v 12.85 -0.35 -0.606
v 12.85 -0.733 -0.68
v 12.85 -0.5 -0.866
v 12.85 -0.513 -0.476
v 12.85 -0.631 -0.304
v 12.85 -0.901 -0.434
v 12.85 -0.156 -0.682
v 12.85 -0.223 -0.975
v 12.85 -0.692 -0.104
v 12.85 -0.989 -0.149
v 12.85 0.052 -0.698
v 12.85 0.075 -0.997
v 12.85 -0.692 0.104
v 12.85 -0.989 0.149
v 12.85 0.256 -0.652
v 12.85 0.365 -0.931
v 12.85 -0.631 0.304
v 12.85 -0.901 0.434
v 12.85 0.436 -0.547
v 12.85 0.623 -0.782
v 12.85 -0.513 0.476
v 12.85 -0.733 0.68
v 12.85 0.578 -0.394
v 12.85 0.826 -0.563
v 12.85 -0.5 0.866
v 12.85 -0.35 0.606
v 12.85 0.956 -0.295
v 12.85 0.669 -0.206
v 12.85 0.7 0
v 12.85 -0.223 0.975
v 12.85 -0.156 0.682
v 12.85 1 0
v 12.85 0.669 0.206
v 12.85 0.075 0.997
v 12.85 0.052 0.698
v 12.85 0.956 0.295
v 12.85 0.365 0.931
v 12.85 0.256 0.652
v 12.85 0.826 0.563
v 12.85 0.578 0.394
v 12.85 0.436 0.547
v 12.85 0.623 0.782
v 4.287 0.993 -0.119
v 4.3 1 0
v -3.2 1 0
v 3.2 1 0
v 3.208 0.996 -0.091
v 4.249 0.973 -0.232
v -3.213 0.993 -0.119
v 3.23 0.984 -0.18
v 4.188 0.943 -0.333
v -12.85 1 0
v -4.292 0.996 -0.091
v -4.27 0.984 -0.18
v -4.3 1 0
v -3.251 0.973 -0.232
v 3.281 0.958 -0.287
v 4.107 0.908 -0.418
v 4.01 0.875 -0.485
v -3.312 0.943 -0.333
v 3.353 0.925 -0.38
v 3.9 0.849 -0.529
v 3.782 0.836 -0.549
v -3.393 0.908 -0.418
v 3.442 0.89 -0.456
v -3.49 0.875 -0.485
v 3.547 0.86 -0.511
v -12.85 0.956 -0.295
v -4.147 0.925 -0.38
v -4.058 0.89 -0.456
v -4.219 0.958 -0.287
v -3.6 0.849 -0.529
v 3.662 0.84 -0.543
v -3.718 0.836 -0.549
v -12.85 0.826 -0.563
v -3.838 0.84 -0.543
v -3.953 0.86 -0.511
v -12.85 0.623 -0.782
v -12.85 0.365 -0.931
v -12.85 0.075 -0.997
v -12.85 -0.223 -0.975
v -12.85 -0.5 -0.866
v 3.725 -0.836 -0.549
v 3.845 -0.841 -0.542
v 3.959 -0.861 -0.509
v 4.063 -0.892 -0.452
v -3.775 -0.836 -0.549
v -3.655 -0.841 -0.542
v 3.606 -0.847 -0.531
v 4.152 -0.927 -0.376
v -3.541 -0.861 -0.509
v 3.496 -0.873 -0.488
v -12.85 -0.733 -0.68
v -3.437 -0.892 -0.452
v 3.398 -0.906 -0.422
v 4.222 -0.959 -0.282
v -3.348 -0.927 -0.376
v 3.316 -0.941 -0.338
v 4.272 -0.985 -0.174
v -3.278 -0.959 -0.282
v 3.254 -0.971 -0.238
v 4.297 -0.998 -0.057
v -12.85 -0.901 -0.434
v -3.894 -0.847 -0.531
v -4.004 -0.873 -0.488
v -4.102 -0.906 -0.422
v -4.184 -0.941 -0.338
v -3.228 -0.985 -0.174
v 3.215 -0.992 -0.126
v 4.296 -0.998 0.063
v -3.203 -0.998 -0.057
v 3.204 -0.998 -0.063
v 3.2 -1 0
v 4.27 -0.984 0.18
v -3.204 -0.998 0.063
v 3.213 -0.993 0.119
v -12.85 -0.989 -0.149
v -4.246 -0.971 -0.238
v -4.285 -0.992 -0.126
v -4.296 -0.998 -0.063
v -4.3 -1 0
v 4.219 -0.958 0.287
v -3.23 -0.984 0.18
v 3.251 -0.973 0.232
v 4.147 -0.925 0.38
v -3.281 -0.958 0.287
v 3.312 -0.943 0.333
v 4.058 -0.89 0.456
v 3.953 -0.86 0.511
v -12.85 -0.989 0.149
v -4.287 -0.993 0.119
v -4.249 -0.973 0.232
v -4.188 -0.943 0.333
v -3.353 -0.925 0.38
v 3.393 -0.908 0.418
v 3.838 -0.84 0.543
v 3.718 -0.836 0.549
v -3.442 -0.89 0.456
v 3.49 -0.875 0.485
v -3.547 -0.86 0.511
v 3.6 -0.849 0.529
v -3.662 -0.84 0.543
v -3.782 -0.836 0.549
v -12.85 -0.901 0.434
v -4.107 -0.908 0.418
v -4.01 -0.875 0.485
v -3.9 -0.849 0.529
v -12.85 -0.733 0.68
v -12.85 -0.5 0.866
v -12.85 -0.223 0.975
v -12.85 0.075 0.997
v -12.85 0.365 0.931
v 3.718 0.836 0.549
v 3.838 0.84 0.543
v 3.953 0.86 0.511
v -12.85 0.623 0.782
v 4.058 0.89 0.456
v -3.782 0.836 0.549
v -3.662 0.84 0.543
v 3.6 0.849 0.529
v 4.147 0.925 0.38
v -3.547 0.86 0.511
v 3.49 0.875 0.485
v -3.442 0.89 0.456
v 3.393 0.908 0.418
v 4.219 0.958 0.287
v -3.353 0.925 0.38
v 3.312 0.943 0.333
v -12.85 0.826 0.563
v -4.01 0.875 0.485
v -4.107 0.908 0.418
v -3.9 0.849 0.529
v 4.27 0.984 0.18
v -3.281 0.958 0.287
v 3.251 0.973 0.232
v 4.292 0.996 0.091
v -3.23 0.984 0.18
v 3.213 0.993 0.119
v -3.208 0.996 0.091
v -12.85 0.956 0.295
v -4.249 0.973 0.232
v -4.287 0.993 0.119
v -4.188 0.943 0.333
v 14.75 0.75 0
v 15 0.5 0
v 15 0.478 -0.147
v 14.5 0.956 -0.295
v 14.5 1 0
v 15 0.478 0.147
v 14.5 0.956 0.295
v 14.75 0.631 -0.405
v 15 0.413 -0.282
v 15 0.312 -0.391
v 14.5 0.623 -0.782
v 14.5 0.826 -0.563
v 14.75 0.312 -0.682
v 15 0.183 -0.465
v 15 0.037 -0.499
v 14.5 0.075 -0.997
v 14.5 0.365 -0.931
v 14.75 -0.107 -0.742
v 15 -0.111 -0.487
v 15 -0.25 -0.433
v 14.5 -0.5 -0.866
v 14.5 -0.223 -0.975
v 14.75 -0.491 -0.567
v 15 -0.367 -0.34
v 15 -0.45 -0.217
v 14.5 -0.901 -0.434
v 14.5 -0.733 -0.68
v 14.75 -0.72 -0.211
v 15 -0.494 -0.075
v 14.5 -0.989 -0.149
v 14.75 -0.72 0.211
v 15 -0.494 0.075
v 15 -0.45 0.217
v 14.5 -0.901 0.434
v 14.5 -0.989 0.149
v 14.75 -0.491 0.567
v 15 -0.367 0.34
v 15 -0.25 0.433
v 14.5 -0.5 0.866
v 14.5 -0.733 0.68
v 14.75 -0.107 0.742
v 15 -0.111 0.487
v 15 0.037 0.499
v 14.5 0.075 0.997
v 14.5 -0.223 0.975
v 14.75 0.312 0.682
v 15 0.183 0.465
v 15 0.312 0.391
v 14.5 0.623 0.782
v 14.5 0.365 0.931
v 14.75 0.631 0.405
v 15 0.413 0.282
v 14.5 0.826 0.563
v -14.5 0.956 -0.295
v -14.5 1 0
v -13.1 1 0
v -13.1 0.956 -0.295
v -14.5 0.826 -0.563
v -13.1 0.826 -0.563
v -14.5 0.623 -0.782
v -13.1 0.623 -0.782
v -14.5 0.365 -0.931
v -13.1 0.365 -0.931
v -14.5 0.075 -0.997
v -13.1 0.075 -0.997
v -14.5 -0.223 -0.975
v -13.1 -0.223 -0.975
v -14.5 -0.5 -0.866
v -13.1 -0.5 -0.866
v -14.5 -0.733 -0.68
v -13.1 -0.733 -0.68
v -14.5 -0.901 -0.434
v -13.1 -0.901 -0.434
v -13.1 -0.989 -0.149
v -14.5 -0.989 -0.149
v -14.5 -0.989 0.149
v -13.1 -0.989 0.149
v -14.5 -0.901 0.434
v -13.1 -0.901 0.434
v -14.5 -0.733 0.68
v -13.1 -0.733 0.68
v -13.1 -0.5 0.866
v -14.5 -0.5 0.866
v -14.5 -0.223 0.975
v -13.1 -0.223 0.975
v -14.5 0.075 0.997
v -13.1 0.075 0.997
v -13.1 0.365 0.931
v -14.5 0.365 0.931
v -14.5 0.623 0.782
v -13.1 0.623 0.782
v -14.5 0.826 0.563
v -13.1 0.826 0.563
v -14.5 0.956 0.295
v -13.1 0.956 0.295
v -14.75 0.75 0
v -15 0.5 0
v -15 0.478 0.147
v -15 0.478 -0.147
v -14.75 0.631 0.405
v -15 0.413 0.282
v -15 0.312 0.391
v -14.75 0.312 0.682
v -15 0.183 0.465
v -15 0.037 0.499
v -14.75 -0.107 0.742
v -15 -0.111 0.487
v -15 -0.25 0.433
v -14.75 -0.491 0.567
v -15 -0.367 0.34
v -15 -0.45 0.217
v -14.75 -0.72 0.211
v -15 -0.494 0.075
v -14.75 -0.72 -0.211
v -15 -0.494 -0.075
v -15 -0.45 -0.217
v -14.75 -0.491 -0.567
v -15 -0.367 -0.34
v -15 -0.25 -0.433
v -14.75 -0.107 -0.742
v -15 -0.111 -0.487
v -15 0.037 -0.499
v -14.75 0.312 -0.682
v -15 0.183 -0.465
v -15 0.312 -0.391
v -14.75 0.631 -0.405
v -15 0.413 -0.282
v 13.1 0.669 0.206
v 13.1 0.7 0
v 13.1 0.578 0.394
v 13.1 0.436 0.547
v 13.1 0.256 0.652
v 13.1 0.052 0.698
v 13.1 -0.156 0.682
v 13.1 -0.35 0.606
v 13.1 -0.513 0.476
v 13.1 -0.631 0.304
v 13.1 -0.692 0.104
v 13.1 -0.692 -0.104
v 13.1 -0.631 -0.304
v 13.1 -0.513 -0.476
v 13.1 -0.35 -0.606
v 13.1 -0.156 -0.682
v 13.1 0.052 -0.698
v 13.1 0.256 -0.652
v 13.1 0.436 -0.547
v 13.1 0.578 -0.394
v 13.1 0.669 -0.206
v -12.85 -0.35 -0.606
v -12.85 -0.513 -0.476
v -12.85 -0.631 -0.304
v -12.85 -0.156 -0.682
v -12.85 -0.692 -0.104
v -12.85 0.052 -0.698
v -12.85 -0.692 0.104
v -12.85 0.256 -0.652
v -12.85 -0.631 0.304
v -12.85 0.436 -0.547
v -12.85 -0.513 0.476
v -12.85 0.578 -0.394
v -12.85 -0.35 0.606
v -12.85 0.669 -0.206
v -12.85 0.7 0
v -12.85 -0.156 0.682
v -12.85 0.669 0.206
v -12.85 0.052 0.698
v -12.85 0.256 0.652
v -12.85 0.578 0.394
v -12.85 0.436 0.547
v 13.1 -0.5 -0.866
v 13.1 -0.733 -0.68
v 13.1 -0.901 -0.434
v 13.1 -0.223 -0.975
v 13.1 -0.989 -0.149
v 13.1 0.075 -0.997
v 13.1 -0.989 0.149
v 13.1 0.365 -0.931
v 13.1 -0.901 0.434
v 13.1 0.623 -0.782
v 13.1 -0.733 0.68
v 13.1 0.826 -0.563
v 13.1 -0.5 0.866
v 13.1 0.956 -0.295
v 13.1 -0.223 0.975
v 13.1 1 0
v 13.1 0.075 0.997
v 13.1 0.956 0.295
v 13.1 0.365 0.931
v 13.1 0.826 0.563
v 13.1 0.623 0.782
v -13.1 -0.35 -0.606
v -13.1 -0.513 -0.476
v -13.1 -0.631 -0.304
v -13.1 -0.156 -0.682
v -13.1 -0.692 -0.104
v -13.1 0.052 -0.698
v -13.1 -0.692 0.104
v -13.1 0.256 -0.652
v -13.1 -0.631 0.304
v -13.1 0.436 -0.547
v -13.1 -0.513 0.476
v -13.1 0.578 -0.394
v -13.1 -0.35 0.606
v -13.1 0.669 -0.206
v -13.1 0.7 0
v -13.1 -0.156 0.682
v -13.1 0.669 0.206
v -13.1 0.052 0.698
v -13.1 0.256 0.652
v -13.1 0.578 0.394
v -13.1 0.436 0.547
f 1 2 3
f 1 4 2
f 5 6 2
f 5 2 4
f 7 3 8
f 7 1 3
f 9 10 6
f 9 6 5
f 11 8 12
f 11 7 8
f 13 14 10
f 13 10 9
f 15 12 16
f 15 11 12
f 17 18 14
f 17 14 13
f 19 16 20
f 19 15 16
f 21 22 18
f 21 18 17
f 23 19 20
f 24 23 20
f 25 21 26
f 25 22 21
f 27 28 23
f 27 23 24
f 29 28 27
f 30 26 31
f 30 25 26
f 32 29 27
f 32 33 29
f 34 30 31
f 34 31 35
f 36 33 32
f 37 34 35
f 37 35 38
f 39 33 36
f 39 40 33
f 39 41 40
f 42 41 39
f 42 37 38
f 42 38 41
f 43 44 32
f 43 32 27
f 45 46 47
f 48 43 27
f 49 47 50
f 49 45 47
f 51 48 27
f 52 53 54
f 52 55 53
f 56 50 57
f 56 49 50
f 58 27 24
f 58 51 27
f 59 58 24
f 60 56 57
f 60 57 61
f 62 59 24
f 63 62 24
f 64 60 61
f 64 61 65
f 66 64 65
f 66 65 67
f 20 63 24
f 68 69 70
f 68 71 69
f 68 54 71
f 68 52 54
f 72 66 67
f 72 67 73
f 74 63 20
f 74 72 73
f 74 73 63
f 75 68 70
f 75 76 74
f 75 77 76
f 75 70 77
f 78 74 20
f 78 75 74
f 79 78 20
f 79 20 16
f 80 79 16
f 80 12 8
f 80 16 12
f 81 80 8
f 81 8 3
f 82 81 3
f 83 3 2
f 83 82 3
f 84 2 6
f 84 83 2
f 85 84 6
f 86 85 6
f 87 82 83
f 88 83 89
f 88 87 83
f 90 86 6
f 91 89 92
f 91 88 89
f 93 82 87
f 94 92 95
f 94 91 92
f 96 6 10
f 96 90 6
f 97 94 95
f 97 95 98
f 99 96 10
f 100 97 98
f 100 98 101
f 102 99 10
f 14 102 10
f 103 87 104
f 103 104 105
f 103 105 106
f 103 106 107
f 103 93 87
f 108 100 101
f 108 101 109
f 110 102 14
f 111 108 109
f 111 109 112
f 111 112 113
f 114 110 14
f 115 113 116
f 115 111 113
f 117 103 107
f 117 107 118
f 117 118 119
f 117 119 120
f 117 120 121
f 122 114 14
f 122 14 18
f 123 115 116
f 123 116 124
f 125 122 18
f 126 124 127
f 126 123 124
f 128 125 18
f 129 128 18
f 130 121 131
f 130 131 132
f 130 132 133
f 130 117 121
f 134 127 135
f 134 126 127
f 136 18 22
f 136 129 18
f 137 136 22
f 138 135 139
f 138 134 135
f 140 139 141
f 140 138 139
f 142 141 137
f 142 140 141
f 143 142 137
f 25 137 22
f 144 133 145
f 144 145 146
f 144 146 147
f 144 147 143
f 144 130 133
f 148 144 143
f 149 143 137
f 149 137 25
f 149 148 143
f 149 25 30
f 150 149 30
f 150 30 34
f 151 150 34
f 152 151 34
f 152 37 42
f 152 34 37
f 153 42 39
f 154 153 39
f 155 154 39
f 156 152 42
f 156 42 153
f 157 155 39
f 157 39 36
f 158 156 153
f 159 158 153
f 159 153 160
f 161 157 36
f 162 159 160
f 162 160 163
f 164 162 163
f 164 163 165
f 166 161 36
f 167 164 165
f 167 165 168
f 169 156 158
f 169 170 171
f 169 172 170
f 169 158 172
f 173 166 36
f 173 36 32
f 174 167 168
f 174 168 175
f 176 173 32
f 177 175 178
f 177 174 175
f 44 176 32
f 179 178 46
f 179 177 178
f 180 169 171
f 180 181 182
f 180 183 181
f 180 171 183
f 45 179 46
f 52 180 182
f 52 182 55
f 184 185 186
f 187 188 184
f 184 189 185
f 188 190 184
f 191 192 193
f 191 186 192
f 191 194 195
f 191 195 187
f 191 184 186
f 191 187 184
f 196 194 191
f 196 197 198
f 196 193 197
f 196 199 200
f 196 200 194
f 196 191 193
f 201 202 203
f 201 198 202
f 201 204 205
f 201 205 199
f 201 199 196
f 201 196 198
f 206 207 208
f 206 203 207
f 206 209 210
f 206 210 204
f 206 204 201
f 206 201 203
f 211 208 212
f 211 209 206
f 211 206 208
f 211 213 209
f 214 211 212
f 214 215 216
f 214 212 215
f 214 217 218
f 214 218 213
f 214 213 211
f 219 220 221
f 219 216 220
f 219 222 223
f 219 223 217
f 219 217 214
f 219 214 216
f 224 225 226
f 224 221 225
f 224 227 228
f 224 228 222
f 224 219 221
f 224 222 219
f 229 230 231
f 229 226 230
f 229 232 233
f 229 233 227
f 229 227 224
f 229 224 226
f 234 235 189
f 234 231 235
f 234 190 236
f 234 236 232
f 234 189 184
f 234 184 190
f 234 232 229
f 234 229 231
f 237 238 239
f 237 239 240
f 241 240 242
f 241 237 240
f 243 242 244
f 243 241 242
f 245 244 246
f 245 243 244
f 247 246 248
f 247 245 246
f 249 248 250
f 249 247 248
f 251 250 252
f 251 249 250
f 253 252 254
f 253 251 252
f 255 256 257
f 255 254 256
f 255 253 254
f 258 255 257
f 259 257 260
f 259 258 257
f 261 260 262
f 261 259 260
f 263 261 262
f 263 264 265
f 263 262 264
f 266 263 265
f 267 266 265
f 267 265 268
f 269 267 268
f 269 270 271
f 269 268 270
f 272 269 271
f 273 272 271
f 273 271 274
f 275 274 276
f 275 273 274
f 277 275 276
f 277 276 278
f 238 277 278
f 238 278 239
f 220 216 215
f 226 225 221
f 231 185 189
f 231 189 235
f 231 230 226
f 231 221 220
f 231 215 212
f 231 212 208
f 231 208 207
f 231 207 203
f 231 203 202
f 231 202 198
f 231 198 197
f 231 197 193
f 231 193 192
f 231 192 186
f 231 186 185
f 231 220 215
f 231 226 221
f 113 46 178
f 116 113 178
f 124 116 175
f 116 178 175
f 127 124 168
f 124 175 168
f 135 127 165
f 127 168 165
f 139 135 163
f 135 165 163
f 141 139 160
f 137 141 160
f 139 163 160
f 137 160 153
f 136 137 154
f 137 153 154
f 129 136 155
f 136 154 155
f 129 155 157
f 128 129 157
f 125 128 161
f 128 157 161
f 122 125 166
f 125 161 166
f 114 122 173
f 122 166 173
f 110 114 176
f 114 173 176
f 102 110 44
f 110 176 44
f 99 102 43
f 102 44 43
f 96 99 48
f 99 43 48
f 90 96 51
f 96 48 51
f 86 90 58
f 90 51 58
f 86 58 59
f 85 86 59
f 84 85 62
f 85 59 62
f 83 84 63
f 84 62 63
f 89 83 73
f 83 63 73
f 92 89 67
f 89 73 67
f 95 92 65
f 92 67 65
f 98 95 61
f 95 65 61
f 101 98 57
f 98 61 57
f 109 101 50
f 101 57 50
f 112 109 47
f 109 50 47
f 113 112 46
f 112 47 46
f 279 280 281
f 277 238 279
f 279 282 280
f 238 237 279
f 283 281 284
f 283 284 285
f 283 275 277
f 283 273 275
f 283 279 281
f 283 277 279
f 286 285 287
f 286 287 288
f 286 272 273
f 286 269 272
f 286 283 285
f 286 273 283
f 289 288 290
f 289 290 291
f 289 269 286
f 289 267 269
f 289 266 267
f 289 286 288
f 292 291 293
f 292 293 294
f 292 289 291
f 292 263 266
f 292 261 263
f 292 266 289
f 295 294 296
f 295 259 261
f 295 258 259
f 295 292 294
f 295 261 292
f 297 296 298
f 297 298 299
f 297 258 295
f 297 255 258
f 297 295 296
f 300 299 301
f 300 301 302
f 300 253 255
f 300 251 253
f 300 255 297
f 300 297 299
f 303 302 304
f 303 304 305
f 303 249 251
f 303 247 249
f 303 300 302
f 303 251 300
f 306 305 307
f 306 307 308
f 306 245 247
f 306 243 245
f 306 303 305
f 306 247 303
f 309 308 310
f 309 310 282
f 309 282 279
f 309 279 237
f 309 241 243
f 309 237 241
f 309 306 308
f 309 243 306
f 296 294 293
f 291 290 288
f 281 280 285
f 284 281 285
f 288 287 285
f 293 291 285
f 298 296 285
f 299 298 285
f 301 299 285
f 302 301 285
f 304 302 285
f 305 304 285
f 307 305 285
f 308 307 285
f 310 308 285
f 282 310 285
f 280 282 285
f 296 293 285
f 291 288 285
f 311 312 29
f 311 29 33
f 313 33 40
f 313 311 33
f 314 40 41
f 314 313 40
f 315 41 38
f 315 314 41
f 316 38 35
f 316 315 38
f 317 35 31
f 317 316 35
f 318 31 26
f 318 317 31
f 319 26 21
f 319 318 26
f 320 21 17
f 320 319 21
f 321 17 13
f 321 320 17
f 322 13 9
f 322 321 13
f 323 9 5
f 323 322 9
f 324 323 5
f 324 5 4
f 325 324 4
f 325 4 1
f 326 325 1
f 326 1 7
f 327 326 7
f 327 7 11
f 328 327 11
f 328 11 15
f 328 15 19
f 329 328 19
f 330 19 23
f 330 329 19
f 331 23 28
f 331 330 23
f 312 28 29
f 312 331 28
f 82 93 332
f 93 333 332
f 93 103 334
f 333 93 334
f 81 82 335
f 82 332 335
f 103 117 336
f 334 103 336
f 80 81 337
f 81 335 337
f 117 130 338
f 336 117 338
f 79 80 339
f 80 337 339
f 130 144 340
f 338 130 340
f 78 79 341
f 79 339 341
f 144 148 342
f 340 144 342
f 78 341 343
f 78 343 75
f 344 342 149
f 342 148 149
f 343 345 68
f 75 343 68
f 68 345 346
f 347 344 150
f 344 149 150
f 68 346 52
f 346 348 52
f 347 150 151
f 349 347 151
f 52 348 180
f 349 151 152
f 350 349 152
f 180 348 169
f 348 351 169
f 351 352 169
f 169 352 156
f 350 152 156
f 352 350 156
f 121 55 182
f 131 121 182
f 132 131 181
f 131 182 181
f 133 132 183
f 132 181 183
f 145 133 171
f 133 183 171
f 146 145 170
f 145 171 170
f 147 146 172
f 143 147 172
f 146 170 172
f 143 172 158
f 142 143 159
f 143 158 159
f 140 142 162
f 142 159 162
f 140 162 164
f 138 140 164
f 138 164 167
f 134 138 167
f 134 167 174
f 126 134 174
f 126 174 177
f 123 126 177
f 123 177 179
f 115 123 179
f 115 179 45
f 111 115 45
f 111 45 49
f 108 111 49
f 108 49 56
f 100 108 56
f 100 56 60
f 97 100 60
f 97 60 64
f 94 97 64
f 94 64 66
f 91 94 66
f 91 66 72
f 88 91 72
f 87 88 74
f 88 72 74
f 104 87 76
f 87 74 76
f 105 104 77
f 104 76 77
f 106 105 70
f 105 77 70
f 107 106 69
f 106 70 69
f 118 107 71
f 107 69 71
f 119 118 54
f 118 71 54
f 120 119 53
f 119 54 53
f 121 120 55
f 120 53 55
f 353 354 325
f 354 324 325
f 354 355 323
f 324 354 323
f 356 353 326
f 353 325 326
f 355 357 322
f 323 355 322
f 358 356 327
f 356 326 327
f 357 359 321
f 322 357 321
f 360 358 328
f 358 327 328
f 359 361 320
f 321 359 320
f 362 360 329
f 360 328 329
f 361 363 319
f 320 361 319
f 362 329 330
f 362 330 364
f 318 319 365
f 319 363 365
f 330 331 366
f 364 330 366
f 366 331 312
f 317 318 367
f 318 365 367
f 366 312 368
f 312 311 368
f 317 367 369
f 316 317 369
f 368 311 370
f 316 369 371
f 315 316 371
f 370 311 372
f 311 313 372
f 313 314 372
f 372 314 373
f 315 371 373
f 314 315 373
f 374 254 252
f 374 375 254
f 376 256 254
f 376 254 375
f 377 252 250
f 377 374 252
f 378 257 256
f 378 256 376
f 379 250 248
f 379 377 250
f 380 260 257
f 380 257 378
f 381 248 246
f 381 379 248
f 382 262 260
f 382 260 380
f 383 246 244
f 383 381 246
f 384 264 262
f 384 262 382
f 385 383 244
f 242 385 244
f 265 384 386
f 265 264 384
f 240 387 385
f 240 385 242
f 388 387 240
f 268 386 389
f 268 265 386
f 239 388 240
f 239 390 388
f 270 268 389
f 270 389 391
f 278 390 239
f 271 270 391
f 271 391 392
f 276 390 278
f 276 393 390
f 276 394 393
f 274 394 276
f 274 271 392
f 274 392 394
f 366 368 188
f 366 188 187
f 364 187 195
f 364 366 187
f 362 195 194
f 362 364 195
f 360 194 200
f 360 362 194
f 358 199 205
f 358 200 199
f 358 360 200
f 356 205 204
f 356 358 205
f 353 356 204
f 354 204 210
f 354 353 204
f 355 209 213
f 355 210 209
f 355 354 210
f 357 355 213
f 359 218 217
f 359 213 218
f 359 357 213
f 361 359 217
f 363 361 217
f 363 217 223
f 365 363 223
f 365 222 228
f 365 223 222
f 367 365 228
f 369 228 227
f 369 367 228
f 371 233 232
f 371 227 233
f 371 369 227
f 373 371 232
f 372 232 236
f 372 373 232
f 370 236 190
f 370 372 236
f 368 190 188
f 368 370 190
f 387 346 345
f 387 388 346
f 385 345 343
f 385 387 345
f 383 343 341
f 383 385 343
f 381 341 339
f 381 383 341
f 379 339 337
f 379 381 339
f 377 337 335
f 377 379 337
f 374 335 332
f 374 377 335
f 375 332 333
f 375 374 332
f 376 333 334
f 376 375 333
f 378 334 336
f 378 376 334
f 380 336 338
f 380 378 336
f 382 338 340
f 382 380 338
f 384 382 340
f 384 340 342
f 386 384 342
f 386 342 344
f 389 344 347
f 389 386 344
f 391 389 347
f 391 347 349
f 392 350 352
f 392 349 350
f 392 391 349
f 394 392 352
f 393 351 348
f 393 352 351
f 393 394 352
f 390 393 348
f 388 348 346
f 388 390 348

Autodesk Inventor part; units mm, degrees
ref_plane "YZ Plane" through (0, 0, 0) normal (1, 0, 0) x (0, 1, 0)
ref_plane "XY Plane" through (0, 0, 0) normal (0, 0, 1) x (1, 0, 0)
sketch "Sketch2" plane through (0, 0, 0) normal (0, 0, 1) x (1, 0, 0)
  line L0 (-15, 1) -> (-15, 0)
  line L1 (-15, 0) -> (15, 0)
  line L2 (15, 0) -> (15, 1)
  line L3 (15, 1) -> (-15, 1)
  line L4 (-15, 1) -> (15, 0) construction
  line L5 (-15, 0) -> (15, 1) construction
  line L6 (-13.1, 1) -> (-12.85, 1)
  line L7 (-12.85, 1) -> (-12.85, 0.7)
  line L8 (-12.85, 0.7) -> (-13.1, 0.7)
  line L9 (-13.1, 0.7) -> (-13.1, 1)
  line L10 (0, 0) -> (0, 1)
  line L11 (12.85, 1) -> (12.85, 0.7)
  line L12 (12.85, 0.7) -> (13.1, 0.7)
  line L13 (13.1, 0.7) -> (13.1, 1)
  line L14 (-21, 0) -> (21, 0) projected
  point P0 (0, 0.5)
  point P1 (0, 0.5)
  dimension "d1" = 1
  dimension "d2" = 30
  dimension "d3" = 0.25
  dimension "d4" = 0.3
  dimension "d5" = 25.7
revolve "Revolution1" add sketch "Sketch2" angle 360 about axis through (-10, 0, 0) along (1, 0, 0) contours L3 L9 L8 L7 L10 L1 L0 | L10 L3 L11 L12 L13 L2 L1
ref_plane "Work Plane1" through (0, 1, 0) normal (0, 1, 0) x (-1, 0, 0)
sketch "Sketch3" plane through (0, 1, 0) normal (0, 1, 0) x (-1, 0, 0)
  circle A0 centre (3.75, 0) radius 0.55
  line L0 (0, 0.9388) -> (0, -0.9388)
  circle A1 centre (-3.75, 0) radius 0.55
  point P0 (0, 0)
  point P1 (0, 0)
  dimension "d10" = 1.1
  dimension "d11" = 7.5
extrude "Extrusion1" cut sketch "Sketch3" against normal through all
chamfer "Chamfer1" distance 0.5 angle 45 2 edges at (-15, -1, 0) (15, -1, 0)
properties part number "axle"
